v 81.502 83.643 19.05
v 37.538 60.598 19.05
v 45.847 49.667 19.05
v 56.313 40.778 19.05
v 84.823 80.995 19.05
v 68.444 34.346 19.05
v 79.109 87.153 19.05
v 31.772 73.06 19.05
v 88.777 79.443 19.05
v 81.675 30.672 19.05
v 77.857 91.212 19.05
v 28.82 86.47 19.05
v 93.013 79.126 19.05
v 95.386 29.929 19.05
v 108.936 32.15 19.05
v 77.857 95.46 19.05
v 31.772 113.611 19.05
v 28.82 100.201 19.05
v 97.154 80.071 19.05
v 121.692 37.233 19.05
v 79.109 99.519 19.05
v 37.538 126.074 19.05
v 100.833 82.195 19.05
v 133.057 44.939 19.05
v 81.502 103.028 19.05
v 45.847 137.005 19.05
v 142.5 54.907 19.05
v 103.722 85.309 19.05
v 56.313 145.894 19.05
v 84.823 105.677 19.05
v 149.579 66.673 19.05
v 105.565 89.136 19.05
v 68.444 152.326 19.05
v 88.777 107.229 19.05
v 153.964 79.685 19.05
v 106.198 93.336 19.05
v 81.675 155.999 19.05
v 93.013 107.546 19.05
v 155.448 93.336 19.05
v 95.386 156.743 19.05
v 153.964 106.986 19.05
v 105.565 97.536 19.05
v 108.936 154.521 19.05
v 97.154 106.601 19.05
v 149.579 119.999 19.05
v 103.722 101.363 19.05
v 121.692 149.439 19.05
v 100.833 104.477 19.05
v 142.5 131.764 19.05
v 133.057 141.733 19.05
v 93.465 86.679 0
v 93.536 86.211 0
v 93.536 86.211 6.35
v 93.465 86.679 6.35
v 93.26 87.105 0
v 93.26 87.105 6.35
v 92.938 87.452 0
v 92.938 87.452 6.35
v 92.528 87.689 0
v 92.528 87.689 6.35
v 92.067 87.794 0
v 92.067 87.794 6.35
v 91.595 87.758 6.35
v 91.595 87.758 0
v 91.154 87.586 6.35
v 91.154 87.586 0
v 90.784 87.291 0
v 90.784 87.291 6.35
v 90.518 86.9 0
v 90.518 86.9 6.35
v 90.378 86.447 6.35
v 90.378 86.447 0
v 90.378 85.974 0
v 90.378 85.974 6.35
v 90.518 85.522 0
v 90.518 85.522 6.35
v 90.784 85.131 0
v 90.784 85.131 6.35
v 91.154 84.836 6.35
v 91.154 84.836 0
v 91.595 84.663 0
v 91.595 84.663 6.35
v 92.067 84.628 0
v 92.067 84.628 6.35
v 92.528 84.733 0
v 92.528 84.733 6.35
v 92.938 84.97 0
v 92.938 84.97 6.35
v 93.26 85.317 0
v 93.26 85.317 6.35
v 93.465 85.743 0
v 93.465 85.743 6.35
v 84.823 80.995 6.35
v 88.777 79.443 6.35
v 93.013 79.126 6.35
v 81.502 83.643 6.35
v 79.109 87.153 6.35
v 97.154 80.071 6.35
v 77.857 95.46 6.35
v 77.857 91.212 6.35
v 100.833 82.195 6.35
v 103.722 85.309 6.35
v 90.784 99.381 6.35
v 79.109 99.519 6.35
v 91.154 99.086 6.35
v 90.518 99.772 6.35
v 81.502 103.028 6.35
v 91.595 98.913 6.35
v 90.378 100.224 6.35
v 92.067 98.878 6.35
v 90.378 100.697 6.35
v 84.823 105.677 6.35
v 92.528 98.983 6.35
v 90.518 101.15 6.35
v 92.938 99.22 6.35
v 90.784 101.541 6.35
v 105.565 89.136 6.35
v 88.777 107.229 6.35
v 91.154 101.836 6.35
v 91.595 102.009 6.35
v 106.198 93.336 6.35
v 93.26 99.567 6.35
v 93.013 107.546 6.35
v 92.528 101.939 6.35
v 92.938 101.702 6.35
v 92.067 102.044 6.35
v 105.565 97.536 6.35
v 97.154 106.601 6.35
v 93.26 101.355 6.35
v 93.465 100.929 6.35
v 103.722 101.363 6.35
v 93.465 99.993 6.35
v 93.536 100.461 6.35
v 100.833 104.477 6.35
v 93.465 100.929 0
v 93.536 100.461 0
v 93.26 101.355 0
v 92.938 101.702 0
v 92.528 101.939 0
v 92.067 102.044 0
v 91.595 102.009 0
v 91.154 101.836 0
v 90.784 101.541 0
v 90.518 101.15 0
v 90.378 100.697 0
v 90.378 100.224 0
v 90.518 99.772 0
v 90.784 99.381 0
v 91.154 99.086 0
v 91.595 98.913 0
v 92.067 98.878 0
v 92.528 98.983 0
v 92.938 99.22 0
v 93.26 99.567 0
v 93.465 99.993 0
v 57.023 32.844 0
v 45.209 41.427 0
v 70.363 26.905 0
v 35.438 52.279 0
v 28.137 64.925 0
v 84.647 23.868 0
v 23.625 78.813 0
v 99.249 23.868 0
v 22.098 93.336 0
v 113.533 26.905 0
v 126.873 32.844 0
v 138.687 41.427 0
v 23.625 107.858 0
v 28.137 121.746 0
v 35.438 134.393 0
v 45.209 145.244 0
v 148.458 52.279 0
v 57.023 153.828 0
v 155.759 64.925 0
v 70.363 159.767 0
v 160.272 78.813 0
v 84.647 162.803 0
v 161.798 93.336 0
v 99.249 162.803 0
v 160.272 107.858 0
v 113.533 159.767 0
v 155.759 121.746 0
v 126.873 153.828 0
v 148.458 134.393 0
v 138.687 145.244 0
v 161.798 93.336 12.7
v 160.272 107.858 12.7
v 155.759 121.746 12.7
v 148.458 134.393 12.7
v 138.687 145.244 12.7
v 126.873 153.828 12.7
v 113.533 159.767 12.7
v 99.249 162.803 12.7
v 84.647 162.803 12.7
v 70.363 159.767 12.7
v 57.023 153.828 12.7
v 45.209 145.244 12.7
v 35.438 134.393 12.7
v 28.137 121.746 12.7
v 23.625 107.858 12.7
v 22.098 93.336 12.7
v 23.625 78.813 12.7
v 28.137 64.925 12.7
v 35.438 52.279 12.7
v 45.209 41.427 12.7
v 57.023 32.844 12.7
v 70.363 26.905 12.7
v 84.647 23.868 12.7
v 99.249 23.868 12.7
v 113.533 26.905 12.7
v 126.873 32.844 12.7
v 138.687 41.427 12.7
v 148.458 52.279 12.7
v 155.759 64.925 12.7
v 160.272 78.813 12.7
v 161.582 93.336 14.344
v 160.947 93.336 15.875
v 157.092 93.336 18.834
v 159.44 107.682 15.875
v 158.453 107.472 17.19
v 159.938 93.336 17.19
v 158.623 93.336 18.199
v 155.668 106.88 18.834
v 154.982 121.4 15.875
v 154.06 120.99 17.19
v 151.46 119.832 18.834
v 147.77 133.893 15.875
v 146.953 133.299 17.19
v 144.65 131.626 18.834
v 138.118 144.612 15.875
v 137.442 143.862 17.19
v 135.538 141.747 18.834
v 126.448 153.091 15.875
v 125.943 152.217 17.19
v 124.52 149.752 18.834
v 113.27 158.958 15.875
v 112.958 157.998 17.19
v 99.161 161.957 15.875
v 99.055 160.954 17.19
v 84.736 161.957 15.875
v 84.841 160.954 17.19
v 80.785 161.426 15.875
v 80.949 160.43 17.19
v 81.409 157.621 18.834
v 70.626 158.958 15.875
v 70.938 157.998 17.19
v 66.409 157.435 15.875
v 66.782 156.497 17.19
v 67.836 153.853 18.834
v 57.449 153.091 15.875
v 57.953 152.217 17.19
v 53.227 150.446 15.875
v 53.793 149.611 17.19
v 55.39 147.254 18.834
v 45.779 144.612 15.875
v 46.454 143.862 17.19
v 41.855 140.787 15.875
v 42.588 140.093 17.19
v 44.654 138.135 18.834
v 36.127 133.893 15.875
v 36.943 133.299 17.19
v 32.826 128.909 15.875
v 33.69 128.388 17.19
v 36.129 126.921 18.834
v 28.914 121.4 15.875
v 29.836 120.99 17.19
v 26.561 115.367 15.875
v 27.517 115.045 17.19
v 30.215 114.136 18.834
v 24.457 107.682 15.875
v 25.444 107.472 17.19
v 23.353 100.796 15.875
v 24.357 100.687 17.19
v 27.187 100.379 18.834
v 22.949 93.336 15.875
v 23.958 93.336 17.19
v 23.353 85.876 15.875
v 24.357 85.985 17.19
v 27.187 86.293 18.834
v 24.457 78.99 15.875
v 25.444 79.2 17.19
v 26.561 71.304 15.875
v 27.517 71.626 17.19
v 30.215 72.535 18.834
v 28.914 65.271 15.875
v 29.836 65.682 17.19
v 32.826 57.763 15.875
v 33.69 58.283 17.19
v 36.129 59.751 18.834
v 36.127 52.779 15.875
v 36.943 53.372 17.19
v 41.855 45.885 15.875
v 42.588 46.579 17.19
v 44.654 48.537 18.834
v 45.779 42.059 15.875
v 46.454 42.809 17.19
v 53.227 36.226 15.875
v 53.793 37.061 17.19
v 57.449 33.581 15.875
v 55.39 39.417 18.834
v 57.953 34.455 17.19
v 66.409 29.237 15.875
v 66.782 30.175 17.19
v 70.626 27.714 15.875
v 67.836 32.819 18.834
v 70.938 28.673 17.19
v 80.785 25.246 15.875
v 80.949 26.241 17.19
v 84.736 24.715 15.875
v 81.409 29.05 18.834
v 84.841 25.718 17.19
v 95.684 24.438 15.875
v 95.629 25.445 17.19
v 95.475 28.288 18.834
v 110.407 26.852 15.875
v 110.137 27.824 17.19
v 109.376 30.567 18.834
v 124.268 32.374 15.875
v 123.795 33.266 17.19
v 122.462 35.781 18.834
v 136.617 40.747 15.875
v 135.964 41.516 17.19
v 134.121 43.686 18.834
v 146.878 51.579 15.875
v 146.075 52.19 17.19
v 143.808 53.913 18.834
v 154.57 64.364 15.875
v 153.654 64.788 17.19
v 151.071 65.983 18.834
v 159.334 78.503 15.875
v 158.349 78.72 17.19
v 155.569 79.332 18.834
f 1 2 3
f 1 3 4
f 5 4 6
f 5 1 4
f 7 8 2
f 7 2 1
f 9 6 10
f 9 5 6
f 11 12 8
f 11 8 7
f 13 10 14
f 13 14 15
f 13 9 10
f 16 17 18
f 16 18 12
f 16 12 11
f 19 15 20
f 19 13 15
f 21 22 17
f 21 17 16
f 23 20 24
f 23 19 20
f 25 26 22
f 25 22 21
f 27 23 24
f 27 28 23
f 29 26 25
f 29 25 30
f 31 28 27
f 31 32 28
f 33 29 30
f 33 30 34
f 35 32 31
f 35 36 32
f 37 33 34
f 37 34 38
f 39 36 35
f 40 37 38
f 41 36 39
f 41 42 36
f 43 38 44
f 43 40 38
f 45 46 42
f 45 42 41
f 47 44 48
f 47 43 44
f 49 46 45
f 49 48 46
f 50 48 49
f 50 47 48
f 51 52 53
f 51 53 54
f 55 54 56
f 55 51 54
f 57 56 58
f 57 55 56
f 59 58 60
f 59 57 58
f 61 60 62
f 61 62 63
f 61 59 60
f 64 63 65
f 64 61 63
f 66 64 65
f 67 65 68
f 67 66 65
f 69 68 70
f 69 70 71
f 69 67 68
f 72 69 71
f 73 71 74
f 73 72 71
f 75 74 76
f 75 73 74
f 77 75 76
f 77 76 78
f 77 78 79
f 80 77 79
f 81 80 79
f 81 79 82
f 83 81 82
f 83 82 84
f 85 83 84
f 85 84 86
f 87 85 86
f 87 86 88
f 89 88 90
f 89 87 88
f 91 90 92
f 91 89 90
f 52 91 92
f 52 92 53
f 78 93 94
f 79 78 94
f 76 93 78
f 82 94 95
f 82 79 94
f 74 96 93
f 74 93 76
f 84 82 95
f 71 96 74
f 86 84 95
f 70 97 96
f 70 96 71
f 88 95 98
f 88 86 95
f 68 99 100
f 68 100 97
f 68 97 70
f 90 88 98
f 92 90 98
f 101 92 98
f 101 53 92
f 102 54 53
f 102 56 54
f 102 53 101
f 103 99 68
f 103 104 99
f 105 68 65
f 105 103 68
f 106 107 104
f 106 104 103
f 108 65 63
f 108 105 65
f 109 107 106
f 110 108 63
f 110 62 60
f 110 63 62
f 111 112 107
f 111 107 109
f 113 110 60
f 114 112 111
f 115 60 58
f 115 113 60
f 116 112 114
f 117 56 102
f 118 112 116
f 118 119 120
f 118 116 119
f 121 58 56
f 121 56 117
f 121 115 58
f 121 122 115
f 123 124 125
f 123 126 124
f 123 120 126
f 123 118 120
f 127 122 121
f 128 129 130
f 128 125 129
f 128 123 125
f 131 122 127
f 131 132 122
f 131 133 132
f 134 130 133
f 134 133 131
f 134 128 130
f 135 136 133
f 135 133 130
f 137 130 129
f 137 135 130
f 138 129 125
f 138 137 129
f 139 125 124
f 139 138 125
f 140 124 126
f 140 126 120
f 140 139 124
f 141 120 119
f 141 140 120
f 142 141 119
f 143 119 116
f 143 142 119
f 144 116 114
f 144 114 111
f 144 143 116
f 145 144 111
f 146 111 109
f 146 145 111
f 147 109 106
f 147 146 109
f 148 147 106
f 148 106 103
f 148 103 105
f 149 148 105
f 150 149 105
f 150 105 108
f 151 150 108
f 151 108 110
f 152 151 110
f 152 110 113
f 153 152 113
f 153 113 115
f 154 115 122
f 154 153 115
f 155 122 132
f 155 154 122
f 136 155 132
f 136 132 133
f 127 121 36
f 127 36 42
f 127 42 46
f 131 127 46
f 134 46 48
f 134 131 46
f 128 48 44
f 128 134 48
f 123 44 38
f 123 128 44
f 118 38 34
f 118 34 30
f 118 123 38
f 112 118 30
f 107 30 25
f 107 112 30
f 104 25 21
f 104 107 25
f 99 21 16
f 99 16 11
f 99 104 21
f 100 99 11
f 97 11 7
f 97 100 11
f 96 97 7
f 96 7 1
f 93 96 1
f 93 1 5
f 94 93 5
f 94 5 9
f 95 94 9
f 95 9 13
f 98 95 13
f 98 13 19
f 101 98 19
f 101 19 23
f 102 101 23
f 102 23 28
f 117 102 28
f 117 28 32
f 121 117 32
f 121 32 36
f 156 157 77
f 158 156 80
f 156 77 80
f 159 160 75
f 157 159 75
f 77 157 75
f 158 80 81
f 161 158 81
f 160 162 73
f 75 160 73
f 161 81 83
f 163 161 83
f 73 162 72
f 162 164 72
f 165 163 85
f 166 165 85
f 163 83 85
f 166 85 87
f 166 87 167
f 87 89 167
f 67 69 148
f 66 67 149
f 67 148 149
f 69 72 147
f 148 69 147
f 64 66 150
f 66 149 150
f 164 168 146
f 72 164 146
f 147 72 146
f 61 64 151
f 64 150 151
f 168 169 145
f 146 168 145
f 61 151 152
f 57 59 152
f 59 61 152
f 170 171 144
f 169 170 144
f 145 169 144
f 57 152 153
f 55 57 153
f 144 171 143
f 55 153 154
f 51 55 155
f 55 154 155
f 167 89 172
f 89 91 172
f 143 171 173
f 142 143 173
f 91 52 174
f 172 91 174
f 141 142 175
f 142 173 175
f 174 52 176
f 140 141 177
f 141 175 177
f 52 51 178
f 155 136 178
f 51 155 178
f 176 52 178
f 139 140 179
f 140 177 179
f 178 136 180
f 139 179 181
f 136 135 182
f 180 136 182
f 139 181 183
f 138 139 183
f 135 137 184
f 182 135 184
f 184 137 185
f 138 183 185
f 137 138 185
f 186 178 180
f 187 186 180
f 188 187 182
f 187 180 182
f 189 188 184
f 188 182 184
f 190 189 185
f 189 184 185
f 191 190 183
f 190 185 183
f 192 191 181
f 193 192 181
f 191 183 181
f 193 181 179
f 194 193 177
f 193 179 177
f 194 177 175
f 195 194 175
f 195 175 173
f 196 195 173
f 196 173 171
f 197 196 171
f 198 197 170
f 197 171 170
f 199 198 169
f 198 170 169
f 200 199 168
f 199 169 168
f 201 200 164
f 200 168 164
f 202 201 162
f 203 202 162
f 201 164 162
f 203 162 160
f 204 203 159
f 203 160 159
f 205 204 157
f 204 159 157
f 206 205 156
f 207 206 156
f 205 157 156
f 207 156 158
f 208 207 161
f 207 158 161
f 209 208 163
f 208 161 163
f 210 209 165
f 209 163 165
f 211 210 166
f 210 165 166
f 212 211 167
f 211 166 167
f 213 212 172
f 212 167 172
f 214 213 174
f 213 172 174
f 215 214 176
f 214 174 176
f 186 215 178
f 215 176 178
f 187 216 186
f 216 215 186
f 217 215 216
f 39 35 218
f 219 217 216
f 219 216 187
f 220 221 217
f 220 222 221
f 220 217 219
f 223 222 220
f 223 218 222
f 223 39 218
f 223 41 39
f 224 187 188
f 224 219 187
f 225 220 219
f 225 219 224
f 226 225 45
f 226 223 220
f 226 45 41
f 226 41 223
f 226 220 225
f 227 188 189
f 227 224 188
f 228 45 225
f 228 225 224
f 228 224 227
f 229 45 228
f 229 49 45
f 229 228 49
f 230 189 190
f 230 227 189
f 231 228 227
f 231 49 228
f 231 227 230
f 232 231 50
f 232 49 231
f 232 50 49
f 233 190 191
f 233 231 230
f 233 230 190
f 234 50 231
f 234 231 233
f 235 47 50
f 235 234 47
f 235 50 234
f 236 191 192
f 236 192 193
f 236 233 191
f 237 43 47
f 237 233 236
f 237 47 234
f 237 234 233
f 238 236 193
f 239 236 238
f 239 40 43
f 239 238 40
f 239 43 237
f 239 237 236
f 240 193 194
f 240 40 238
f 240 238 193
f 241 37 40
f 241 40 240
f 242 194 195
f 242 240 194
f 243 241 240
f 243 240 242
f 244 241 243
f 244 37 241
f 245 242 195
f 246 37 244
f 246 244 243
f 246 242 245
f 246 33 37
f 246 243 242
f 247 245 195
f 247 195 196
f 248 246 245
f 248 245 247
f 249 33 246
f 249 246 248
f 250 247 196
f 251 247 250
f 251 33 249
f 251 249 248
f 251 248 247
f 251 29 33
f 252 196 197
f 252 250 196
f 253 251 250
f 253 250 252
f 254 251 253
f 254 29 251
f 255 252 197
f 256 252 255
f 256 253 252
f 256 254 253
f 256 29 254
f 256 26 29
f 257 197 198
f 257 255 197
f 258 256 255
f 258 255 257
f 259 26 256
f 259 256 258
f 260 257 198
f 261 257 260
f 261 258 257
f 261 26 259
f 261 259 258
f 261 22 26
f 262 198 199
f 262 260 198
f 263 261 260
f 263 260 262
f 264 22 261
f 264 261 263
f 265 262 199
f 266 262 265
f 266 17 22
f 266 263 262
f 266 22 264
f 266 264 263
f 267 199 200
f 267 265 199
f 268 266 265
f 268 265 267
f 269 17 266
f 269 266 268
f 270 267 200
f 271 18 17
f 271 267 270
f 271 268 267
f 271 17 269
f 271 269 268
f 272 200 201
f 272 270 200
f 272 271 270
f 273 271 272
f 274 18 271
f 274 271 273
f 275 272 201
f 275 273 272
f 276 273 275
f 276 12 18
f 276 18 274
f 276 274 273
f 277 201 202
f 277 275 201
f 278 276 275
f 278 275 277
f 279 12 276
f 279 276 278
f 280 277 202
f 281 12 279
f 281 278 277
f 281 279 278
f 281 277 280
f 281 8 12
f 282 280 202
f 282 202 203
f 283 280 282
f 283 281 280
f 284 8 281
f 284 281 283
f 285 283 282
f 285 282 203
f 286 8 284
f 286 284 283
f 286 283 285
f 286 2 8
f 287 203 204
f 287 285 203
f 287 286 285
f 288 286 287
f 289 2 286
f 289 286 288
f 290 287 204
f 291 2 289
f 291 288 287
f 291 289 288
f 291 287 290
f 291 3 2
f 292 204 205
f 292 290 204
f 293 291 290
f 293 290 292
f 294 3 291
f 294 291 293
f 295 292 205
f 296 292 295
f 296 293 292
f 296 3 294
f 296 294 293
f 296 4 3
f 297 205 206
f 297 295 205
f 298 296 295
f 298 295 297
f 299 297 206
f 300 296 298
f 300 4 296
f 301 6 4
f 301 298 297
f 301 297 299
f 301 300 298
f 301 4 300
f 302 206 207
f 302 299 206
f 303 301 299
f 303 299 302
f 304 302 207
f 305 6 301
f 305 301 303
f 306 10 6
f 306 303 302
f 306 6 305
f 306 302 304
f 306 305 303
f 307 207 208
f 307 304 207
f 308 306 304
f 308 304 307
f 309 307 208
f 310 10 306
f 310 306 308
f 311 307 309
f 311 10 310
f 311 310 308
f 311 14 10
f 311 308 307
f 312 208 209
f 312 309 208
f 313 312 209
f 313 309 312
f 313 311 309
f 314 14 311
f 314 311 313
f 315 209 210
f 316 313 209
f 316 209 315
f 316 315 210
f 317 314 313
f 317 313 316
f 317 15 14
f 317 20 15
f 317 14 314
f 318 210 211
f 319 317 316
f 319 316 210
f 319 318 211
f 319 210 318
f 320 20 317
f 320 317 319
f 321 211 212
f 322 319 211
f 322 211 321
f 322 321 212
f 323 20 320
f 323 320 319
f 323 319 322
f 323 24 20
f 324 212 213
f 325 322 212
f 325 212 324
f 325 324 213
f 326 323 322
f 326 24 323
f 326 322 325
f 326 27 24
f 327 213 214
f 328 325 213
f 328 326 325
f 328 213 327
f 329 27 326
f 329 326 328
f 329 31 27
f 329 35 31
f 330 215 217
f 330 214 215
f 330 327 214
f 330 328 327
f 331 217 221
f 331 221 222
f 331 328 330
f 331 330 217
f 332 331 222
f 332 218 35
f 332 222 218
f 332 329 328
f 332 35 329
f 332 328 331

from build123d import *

# Parameters (mm, degrees)
F0_R     = 69.85
F0_R_2   = 14.25
F1_DEPTH = 19.05
F0_R_3   = 1.5875
F2_DEPTH = 6.35
F3_R     = 6.35


with BuildPart() as f1:
    # F0 (on Top) → F1 (new body)
    with BuildSketch(Plane.XY):
        with Locations((91.948161, 93.335833)):
            Circle(F0_R)
        with Locations((91.948161, 93.335833)):
            Circle(F0_R_2, mode=Mode.SUBTRACT)
    extrude(amount=F1_DEPTH)

    # F0 (on Top) → F2 (join)
    with BuildSketch(Plane.XY):
        with Locations((91.948161, 93.335833)):
            Circle(F0_R_2)
        with Locations((91.948161, 86.210787)):
            Circle(F0_R_3, mode=Mode.SUBTRACT)
        with Locations((91.948161, 100.460879)):
            Circle(F0_R_3, mode=Mode.SUBTRACT)
    extrude(amount=F2_DEPTH)

    # F3
    f3_edges = [f1.edges().sort_by_distance(p)[0] for p in [
        (22.098161, 93.335833, 19.05),
    ]]
    fillet(f3_edges, radius=F3_R)


solid = f1.part
